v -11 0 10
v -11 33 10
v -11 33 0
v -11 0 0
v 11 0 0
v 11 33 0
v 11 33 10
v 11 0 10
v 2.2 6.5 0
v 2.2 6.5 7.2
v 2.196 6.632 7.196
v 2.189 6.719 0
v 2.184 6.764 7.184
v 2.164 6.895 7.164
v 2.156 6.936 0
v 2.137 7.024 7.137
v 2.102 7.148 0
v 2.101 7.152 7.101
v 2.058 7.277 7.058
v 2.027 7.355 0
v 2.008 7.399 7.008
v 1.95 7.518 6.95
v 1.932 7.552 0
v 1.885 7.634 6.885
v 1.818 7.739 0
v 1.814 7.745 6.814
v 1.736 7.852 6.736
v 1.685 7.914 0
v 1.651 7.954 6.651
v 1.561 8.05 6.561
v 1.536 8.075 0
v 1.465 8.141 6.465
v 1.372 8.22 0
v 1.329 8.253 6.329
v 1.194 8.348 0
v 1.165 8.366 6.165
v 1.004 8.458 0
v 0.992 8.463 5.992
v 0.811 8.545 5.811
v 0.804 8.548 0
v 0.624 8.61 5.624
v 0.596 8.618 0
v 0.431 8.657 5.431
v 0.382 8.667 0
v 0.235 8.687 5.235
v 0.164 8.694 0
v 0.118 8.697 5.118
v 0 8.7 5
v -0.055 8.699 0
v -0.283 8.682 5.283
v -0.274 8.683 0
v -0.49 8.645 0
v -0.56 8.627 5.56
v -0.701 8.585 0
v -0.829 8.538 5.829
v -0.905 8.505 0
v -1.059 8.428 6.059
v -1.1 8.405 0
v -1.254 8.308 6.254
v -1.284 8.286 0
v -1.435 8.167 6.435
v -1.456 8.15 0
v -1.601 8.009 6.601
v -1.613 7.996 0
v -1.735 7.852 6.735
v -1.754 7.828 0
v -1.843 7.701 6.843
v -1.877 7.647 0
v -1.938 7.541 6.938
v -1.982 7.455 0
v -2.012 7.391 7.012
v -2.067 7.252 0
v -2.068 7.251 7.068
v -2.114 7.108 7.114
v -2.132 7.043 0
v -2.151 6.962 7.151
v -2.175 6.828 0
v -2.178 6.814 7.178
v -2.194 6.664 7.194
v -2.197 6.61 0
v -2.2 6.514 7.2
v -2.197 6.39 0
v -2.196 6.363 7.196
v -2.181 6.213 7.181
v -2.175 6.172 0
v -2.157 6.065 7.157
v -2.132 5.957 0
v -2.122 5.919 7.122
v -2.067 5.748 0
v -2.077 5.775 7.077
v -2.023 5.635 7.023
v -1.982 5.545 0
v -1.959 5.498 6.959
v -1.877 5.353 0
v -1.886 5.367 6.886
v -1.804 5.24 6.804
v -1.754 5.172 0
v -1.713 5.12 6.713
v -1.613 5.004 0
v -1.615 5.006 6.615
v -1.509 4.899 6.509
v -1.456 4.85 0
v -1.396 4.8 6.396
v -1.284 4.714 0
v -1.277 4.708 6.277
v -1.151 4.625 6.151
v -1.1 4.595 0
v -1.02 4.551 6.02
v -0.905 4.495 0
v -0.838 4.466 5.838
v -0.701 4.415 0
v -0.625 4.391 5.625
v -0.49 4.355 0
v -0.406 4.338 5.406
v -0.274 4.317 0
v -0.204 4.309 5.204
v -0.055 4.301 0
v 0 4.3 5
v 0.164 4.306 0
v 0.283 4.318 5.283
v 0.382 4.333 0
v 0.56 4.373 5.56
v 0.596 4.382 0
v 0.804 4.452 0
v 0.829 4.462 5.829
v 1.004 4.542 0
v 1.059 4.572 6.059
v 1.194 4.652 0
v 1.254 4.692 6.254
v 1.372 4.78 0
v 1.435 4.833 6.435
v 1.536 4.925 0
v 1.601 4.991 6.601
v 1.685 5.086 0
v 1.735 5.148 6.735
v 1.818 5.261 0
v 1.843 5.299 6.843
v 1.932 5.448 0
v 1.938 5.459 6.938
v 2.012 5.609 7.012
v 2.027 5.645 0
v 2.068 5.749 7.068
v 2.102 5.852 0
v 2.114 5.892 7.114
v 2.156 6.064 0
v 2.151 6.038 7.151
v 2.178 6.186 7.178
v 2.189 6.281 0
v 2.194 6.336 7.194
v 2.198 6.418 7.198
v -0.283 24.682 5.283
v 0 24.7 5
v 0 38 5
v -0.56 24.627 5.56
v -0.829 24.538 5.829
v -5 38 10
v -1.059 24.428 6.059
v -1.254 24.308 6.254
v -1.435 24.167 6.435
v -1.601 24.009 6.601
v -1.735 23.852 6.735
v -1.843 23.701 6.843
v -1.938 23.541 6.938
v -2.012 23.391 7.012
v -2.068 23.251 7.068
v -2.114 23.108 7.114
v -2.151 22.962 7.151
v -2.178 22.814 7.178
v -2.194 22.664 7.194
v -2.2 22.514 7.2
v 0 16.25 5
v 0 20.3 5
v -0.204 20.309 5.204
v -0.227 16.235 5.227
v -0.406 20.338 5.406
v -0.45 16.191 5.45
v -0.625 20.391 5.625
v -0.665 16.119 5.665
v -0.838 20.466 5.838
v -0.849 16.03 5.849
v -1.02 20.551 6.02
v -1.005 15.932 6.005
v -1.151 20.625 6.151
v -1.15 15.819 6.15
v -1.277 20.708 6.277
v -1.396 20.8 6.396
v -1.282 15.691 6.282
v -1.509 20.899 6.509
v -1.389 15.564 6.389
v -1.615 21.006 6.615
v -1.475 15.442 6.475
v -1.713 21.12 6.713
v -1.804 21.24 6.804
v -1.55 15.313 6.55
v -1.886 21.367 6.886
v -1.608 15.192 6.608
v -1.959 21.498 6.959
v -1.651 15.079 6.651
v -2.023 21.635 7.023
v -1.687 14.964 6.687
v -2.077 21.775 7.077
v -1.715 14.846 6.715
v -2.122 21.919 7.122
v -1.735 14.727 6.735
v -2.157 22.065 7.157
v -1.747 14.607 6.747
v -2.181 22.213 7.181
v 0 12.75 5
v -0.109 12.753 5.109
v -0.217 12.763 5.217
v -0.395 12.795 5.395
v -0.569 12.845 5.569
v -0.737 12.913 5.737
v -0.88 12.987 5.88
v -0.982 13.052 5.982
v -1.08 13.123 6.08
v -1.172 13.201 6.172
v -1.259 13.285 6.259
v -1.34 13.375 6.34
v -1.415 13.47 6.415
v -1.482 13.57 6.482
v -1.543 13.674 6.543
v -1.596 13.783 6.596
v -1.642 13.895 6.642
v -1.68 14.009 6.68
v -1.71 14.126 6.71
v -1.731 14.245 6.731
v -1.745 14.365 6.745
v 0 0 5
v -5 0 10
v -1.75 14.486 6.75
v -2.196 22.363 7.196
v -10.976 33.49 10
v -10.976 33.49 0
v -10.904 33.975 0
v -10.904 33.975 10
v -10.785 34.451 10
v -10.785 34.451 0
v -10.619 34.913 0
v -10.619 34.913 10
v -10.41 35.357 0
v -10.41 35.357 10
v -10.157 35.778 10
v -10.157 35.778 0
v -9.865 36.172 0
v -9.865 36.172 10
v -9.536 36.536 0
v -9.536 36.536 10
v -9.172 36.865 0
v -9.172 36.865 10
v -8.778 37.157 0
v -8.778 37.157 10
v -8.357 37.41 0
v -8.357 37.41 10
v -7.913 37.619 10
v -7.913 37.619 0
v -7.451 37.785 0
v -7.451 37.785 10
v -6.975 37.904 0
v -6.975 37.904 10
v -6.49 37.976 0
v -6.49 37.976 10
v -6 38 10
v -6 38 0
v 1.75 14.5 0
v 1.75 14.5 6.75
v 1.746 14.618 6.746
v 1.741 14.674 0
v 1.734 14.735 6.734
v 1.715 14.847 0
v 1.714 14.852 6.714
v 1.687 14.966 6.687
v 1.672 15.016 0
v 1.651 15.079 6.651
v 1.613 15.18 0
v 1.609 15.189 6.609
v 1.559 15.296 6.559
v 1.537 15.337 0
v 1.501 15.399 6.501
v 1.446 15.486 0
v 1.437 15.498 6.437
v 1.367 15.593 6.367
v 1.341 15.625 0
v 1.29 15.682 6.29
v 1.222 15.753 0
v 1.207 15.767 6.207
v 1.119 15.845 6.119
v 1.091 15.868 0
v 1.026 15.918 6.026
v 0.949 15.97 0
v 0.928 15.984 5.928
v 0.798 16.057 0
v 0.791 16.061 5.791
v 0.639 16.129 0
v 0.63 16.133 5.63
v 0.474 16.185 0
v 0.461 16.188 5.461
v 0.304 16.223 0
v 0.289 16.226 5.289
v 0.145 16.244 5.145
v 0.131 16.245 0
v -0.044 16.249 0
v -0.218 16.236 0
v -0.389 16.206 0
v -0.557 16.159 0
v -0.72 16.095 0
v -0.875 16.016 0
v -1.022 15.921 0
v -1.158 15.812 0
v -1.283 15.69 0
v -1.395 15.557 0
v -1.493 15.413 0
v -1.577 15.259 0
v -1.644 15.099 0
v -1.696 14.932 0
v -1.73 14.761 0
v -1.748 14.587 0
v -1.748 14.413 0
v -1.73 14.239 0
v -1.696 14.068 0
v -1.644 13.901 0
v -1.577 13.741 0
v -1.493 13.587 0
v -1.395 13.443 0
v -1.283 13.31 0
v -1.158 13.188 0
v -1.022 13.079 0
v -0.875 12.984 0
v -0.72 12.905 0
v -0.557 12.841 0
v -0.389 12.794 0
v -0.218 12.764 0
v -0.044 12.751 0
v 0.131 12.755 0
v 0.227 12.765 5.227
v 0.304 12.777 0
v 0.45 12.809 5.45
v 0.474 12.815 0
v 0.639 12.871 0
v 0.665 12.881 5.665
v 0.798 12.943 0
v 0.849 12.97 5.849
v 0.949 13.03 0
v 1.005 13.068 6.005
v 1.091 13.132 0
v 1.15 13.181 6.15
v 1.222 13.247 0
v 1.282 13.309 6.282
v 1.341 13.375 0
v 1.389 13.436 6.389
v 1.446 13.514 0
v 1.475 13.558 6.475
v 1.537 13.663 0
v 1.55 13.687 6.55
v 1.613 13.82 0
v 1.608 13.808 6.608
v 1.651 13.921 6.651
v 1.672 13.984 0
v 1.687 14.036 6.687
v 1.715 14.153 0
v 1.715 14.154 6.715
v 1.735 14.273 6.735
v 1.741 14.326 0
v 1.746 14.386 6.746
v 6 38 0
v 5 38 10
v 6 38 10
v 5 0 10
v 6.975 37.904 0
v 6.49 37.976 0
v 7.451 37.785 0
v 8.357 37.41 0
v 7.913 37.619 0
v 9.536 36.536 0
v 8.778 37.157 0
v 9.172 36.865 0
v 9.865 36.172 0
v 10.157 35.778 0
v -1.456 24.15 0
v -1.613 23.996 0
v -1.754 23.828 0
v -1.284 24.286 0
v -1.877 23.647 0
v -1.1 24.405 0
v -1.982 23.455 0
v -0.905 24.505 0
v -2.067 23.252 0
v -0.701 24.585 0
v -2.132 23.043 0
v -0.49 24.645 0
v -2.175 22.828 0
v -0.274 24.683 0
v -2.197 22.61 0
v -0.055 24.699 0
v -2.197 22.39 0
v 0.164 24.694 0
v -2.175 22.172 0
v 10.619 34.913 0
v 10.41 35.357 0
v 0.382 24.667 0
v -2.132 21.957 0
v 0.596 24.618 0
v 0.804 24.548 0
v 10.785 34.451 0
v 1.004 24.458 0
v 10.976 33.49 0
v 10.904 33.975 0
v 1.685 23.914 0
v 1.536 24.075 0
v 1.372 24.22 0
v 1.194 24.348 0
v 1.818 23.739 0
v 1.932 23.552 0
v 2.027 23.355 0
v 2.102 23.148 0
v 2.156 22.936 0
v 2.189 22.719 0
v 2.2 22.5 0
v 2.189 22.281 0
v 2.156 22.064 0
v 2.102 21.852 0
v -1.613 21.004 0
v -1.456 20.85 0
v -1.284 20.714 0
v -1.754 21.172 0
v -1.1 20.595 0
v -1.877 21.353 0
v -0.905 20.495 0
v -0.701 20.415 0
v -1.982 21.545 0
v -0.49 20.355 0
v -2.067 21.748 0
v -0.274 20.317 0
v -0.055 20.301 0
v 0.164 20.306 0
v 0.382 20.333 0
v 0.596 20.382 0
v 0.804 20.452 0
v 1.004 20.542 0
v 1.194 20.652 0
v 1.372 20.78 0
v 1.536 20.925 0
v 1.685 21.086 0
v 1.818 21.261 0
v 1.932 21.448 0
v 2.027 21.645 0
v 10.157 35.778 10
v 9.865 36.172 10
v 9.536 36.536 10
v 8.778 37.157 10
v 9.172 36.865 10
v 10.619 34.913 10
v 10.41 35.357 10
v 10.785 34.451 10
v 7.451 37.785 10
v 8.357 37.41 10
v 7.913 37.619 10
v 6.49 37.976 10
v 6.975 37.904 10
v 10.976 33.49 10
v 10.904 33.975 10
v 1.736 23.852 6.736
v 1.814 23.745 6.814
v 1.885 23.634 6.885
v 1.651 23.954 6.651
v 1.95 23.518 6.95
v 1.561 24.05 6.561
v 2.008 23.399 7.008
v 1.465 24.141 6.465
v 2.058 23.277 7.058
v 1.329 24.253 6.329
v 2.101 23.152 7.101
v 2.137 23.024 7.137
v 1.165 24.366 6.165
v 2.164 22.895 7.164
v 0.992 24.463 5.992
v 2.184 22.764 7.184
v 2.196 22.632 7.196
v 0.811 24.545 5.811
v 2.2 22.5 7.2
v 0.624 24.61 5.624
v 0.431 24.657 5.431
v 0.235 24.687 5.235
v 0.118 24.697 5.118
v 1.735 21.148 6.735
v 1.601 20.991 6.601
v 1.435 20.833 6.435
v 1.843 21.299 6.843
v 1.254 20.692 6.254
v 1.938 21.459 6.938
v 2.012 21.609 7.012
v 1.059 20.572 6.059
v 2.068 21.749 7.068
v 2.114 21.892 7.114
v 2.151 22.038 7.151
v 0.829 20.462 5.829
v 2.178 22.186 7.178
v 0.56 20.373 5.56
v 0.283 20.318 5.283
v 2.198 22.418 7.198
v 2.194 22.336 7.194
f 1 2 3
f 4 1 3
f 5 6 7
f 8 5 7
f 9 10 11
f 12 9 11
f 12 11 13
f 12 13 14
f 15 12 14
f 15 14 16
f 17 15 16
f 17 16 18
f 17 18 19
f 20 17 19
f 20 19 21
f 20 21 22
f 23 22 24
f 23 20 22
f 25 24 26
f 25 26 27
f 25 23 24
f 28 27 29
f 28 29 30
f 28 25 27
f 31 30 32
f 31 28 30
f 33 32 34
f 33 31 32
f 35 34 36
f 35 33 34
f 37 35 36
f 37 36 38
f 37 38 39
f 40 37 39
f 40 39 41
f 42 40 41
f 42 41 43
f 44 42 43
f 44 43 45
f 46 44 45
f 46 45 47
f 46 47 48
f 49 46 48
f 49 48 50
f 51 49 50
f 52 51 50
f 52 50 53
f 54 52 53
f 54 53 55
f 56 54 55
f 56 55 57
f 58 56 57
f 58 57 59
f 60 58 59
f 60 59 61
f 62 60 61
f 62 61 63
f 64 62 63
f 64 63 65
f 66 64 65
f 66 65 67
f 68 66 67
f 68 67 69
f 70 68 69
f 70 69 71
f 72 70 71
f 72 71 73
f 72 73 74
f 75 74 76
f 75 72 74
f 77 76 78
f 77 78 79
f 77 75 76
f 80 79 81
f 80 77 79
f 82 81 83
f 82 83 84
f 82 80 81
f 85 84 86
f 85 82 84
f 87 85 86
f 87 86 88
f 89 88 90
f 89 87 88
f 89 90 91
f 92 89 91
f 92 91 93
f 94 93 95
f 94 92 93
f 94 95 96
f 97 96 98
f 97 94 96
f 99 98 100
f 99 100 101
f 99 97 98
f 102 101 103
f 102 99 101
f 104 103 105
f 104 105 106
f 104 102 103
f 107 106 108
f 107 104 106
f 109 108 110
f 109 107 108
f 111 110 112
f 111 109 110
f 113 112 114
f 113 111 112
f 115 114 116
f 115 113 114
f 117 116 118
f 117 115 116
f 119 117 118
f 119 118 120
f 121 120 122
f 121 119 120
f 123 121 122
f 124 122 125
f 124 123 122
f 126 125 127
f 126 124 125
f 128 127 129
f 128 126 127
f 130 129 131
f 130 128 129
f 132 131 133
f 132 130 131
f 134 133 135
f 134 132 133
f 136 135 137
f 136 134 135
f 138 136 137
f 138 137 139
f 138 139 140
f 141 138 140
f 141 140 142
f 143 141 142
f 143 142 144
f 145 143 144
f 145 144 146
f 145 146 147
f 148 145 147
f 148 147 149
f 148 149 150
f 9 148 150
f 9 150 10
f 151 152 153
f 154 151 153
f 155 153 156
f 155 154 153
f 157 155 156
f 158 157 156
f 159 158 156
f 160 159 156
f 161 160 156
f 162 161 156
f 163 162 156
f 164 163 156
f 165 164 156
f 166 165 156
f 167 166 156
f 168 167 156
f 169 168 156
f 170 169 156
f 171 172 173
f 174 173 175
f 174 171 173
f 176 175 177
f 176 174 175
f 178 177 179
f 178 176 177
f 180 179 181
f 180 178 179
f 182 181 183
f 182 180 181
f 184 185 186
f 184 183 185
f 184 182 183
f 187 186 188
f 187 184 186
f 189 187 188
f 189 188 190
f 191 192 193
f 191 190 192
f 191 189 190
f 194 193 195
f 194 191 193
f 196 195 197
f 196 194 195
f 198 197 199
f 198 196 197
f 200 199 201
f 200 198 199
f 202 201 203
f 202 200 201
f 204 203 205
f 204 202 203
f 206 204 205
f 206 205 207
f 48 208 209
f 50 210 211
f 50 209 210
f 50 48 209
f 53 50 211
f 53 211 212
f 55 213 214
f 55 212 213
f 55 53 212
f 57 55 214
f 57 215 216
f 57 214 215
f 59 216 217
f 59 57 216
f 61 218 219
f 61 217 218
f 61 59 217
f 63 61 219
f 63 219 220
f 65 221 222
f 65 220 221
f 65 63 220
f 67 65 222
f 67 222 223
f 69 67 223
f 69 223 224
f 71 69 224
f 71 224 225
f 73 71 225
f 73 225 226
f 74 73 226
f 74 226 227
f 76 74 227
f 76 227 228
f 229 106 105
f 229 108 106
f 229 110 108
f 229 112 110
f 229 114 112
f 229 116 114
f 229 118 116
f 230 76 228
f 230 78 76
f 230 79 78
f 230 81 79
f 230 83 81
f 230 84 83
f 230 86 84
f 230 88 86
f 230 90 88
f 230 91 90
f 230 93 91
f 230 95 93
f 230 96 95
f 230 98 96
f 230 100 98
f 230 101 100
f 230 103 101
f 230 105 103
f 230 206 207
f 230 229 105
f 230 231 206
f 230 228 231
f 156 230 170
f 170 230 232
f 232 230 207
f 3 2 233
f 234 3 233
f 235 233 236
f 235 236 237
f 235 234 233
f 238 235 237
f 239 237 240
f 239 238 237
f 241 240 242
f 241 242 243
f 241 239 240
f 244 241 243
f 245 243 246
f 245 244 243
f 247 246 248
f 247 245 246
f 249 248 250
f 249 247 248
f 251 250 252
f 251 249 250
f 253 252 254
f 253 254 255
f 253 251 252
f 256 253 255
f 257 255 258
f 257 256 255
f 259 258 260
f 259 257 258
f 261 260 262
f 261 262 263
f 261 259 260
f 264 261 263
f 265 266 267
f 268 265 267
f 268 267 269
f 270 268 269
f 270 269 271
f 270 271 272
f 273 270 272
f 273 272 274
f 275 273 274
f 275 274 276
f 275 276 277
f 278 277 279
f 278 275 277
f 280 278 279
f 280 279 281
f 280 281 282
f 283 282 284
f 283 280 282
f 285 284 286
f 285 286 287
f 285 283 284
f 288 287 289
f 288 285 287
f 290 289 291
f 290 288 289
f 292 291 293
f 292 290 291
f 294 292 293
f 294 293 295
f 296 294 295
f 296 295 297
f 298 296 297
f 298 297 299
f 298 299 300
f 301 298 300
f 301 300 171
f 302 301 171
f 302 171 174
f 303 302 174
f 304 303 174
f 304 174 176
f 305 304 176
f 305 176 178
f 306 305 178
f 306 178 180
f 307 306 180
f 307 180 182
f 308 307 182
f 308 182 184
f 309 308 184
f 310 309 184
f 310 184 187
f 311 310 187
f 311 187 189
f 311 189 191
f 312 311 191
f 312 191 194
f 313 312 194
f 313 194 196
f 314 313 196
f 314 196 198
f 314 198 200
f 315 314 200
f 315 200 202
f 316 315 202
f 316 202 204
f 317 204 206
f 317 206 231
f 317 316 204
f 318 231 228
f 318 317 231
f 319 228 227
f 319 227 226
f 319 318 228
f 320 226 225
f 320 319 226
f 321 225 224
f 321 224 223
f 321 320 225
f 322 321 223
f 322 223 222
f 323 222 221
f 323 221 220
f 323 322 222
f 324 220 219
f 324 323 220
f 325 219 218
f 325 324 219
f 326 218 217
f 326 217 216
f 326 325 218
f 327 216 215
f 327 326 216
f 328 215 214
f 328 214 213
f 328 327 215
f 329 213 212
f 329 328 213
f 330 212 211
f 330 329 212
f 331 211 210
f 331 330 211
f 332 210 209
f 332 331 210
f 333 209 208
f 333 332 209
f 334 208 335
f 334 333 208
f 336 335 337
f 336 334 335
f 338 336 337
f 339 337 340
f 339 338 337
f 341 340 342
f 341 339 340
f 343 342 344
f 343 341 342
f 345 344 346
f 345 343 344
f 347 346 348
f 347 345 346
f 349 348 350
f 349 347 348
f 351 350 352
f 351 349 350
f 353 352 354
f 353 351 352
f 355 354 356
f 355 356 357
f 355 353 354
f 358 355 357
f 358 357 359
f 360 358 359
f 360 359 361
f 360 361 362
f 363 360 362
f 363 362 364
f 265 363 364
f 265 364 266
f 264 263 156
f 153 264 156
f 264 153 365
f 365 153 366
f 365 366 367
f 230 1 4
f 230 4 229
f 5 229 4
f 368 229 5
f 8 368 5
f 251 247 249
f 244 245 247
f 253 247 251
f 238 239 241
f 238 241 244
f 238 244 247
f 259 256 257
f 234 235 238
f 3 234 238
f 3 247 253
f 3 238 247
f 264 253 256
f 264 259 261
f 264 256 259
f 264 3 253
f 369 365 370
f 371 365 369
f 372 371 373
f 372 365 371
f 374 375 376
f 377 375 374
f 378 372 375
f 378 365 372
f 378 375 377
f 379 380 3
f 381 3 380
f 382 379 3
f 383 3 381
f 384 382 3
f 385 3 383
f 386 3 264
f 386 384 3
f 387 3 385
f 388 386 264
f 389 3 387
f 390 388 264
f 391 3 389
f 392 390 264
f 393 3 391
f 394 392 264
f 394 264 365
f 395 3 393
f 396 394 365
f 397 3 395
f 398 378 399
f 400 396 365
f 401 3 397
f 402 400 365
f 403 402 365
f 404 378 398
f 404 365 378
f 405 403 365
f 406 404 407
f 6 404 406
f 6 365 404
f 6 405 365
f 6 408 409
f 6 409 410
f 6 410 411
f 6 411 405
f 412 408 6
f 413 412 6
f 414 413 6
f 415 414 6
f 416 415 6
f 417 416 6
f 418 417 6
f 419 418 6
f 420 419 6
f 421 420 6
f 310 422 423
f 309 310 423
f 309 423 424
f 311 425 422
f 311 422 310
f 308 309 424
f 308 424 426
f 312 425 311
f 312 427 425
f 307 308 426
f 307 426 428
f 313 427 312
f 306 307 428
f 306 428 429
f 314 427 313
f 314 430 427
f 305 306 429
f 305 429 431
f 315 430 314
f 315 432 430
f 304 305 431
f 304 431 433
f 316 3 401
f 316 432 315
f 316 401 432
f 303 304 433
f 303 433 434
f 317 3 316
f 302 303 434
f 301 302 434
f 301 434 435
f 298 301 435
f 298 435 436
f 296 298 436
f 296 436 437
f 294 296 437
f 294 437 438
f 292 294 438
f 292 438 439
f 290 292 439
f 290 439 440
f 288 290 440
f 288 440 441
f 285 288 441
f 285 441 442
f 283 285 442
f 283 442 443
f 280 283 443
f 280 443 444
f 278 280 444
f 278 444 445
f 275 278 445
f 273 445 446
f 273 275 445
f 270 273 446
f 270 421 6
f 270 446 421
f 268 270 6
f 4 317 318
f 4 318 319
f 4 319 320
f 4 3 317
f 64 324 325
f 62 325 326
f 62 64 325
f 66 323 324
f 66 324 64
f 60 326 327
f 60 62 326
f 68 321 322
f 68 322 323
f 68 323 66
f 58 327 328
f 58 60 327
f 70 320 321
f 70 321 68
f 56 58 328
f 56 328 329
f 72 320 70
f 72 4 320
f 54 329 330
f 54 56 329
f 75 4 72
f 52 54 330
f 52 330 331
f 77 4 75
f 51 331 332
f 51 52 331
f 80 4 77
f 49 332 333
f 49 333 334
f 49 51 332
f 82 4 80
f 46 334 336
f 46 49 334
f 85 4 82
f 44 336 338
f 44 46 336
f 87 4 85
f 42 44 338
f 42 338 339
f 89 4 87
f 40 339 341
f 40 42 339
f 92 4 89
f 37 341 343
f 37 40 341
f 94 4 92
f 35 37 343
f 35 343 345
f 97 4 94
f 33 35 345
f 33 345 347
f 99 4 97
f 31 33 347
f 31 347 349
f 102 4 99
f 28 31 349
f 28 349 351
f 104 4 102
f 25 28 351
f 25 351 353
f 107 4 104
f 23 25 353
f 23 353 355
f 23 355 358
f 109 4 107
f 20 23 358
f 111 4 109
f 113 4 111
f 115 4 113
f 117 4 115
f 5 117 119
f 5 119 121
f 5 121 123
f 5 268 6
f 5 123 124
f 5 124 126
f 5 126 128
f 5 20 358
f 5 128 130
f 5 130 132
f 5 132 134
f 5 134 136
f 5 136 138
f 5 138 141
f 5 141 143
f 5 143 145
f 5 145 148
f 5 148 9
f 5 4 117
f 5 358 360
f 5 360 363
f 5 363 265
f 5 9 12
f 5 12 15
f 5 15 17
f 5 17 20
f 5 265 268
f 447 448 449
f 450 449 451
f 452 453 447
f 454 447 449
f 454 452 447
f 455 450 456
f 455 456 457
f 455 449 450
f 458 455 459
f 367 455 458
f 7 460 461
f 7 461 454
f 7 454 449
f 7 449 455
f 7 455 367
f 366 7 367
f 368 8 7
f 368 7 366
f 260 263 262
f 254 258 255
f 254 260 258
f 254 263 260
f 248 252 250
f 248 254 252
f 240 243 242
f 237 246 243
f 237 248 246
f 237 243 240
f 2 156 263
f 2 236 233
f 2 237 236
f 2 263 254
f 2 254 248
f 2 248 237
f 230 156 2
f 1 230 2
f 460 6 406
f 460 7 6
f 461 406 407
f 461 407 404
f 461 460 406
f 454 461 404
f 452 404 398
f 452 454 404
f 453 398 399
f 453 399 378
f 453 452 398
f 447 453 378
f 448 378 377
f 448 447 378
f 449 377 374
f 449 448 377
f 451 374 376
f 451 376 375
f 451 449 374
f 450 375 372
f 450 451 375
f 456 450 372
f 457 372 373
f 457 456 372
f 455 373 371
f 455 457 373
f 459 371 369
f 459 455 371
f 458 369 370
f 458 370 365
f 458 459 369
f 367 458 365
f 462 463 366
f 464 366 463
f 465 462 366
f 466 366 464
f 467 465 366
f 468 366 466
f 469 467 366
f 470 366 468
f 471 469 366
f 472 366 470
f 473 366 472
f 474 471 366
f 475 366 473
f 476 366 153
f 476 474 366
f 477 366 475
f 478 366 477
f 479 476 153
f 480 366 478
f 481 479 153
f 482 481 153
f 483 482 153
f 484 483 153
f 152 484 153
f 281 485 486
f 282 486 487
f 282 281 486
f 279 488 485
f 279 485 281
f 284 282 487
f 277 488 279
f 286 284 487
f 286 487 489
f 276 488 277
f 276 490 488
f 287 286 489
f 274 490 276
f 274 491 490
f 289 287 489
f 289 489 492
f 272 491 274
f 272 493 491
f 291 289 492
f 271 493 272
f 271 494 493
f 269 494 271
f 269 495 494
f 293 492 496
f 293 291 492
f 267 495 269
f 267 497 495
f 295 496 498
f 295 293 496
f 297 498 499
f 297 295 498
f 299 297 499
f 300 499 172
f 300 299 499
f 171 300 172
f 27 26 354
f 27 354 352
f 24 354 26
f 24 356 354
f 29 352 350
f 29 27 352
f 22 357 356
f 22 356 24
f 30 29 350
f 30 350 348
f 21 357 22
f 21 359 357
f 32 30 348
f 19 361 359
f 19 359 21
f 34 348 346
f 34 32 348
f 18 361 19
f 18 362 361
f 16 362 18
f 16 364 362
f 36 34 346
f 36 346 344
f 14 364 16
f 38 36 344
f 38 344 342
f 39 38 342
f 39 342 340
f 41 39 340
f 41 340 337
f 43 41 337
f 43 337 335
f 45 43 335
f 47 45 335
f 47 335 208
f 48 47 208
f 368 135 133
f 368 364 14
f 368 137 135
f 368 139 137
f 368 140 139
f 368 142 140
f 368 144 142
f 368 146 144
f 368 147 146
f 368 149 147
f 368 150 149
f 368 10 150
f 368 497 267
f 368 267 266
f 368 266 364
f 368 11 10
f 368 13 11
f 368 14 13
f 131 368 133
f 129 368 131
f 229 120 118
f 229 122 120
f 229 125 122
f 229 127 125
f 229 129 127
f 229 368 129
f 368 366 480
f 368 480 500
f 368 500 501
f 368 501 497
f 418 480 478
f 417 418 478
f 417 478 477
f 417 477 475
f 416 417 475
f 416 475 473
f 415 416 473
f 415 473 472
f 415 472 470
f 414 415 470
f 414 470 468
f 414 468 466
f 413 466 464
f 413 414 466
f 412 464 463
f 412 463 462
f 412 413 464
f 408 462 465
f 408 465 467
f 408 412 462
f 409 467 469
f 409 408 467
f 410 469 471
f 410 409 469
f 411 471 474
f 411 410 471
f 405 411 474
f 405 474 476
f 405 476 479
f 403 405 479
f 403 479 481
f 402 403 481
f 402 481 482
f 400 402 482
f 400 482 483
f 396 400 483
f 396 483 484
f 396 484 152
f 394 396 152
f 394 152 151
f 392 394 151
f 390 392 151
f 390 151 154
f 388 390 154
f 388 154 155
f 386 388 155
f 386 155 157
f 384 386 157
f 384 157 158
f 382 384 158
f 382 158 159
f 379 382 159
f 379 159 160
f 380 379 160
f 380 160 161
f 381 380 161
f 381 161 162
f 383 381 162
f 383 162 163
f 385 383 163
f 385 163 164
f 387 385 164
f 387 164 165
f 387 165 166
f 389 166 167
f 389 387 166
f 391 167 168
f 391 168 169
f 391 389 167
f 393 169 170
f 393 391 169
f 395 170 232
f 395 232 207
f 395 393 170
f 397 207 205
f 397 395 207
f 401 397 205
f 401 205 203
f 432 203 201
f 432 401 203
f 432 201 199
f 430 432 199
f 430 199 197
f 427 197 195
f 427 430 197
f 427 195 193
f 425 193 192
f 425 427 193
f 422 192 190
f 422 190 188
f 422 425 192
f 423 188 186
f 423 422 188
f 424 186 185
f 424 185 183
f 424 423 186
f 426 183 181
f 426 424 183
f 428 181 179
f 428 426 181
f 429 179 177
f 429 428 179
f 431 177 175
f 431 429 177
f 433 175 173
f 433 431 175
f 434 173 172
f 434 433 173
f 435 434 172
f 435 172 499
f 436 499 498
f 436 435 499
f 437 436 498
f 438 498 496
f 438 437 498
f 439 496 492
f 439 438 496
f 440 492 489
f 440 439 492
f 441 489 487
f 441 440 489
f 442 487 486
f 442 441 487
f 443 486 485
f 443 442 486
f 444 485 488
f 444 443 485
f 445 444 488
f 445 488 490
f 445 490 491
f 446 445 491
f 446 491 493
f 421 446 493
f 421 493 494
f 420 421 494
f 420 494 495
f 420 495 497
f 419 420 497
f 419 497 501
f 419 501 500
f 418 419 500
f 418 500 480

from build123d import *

# Parameters (mm, degrees)
F1_DEPTH = 38
F2_R     = 5
F3_R     = 2.2
F3_R_2   = 1.75
F4_DEPTH = 10.001


with BuildPart() as f1:
    # F0 (on Front) → F1 (new body)
    with BuildSketch(Plane.XZ):
        Polygon((-11, 10), (-11, 0), (11, 0), (11, 10), (5, 10), (0, 5), (-5, 10), align=None)
    extrude(amount=-F1_DEPTH)

    # F2
    f2_edges = [f1.edges().sort_by_distance(p)[0] for p in [
        (11, 38, 5),
        (-11, 38, 5),
    ]]
    fillet(f2_edges, radius=F2_R)

    # F3 (on Top) → F4 (cut, through all)
    with BuildSketch(Plane.XY):
        with Locations((0, 6.5)):
            Circle(F3_R)
        with Locations((0, 22.5)):
            Circle(F3_R)
        with Locations((0, 14.5)):
            Circle(F3_R_2)
    extrude(amount=F4_DEPTH, mode=Mode.SUBTRACT)


solid = f1.part
